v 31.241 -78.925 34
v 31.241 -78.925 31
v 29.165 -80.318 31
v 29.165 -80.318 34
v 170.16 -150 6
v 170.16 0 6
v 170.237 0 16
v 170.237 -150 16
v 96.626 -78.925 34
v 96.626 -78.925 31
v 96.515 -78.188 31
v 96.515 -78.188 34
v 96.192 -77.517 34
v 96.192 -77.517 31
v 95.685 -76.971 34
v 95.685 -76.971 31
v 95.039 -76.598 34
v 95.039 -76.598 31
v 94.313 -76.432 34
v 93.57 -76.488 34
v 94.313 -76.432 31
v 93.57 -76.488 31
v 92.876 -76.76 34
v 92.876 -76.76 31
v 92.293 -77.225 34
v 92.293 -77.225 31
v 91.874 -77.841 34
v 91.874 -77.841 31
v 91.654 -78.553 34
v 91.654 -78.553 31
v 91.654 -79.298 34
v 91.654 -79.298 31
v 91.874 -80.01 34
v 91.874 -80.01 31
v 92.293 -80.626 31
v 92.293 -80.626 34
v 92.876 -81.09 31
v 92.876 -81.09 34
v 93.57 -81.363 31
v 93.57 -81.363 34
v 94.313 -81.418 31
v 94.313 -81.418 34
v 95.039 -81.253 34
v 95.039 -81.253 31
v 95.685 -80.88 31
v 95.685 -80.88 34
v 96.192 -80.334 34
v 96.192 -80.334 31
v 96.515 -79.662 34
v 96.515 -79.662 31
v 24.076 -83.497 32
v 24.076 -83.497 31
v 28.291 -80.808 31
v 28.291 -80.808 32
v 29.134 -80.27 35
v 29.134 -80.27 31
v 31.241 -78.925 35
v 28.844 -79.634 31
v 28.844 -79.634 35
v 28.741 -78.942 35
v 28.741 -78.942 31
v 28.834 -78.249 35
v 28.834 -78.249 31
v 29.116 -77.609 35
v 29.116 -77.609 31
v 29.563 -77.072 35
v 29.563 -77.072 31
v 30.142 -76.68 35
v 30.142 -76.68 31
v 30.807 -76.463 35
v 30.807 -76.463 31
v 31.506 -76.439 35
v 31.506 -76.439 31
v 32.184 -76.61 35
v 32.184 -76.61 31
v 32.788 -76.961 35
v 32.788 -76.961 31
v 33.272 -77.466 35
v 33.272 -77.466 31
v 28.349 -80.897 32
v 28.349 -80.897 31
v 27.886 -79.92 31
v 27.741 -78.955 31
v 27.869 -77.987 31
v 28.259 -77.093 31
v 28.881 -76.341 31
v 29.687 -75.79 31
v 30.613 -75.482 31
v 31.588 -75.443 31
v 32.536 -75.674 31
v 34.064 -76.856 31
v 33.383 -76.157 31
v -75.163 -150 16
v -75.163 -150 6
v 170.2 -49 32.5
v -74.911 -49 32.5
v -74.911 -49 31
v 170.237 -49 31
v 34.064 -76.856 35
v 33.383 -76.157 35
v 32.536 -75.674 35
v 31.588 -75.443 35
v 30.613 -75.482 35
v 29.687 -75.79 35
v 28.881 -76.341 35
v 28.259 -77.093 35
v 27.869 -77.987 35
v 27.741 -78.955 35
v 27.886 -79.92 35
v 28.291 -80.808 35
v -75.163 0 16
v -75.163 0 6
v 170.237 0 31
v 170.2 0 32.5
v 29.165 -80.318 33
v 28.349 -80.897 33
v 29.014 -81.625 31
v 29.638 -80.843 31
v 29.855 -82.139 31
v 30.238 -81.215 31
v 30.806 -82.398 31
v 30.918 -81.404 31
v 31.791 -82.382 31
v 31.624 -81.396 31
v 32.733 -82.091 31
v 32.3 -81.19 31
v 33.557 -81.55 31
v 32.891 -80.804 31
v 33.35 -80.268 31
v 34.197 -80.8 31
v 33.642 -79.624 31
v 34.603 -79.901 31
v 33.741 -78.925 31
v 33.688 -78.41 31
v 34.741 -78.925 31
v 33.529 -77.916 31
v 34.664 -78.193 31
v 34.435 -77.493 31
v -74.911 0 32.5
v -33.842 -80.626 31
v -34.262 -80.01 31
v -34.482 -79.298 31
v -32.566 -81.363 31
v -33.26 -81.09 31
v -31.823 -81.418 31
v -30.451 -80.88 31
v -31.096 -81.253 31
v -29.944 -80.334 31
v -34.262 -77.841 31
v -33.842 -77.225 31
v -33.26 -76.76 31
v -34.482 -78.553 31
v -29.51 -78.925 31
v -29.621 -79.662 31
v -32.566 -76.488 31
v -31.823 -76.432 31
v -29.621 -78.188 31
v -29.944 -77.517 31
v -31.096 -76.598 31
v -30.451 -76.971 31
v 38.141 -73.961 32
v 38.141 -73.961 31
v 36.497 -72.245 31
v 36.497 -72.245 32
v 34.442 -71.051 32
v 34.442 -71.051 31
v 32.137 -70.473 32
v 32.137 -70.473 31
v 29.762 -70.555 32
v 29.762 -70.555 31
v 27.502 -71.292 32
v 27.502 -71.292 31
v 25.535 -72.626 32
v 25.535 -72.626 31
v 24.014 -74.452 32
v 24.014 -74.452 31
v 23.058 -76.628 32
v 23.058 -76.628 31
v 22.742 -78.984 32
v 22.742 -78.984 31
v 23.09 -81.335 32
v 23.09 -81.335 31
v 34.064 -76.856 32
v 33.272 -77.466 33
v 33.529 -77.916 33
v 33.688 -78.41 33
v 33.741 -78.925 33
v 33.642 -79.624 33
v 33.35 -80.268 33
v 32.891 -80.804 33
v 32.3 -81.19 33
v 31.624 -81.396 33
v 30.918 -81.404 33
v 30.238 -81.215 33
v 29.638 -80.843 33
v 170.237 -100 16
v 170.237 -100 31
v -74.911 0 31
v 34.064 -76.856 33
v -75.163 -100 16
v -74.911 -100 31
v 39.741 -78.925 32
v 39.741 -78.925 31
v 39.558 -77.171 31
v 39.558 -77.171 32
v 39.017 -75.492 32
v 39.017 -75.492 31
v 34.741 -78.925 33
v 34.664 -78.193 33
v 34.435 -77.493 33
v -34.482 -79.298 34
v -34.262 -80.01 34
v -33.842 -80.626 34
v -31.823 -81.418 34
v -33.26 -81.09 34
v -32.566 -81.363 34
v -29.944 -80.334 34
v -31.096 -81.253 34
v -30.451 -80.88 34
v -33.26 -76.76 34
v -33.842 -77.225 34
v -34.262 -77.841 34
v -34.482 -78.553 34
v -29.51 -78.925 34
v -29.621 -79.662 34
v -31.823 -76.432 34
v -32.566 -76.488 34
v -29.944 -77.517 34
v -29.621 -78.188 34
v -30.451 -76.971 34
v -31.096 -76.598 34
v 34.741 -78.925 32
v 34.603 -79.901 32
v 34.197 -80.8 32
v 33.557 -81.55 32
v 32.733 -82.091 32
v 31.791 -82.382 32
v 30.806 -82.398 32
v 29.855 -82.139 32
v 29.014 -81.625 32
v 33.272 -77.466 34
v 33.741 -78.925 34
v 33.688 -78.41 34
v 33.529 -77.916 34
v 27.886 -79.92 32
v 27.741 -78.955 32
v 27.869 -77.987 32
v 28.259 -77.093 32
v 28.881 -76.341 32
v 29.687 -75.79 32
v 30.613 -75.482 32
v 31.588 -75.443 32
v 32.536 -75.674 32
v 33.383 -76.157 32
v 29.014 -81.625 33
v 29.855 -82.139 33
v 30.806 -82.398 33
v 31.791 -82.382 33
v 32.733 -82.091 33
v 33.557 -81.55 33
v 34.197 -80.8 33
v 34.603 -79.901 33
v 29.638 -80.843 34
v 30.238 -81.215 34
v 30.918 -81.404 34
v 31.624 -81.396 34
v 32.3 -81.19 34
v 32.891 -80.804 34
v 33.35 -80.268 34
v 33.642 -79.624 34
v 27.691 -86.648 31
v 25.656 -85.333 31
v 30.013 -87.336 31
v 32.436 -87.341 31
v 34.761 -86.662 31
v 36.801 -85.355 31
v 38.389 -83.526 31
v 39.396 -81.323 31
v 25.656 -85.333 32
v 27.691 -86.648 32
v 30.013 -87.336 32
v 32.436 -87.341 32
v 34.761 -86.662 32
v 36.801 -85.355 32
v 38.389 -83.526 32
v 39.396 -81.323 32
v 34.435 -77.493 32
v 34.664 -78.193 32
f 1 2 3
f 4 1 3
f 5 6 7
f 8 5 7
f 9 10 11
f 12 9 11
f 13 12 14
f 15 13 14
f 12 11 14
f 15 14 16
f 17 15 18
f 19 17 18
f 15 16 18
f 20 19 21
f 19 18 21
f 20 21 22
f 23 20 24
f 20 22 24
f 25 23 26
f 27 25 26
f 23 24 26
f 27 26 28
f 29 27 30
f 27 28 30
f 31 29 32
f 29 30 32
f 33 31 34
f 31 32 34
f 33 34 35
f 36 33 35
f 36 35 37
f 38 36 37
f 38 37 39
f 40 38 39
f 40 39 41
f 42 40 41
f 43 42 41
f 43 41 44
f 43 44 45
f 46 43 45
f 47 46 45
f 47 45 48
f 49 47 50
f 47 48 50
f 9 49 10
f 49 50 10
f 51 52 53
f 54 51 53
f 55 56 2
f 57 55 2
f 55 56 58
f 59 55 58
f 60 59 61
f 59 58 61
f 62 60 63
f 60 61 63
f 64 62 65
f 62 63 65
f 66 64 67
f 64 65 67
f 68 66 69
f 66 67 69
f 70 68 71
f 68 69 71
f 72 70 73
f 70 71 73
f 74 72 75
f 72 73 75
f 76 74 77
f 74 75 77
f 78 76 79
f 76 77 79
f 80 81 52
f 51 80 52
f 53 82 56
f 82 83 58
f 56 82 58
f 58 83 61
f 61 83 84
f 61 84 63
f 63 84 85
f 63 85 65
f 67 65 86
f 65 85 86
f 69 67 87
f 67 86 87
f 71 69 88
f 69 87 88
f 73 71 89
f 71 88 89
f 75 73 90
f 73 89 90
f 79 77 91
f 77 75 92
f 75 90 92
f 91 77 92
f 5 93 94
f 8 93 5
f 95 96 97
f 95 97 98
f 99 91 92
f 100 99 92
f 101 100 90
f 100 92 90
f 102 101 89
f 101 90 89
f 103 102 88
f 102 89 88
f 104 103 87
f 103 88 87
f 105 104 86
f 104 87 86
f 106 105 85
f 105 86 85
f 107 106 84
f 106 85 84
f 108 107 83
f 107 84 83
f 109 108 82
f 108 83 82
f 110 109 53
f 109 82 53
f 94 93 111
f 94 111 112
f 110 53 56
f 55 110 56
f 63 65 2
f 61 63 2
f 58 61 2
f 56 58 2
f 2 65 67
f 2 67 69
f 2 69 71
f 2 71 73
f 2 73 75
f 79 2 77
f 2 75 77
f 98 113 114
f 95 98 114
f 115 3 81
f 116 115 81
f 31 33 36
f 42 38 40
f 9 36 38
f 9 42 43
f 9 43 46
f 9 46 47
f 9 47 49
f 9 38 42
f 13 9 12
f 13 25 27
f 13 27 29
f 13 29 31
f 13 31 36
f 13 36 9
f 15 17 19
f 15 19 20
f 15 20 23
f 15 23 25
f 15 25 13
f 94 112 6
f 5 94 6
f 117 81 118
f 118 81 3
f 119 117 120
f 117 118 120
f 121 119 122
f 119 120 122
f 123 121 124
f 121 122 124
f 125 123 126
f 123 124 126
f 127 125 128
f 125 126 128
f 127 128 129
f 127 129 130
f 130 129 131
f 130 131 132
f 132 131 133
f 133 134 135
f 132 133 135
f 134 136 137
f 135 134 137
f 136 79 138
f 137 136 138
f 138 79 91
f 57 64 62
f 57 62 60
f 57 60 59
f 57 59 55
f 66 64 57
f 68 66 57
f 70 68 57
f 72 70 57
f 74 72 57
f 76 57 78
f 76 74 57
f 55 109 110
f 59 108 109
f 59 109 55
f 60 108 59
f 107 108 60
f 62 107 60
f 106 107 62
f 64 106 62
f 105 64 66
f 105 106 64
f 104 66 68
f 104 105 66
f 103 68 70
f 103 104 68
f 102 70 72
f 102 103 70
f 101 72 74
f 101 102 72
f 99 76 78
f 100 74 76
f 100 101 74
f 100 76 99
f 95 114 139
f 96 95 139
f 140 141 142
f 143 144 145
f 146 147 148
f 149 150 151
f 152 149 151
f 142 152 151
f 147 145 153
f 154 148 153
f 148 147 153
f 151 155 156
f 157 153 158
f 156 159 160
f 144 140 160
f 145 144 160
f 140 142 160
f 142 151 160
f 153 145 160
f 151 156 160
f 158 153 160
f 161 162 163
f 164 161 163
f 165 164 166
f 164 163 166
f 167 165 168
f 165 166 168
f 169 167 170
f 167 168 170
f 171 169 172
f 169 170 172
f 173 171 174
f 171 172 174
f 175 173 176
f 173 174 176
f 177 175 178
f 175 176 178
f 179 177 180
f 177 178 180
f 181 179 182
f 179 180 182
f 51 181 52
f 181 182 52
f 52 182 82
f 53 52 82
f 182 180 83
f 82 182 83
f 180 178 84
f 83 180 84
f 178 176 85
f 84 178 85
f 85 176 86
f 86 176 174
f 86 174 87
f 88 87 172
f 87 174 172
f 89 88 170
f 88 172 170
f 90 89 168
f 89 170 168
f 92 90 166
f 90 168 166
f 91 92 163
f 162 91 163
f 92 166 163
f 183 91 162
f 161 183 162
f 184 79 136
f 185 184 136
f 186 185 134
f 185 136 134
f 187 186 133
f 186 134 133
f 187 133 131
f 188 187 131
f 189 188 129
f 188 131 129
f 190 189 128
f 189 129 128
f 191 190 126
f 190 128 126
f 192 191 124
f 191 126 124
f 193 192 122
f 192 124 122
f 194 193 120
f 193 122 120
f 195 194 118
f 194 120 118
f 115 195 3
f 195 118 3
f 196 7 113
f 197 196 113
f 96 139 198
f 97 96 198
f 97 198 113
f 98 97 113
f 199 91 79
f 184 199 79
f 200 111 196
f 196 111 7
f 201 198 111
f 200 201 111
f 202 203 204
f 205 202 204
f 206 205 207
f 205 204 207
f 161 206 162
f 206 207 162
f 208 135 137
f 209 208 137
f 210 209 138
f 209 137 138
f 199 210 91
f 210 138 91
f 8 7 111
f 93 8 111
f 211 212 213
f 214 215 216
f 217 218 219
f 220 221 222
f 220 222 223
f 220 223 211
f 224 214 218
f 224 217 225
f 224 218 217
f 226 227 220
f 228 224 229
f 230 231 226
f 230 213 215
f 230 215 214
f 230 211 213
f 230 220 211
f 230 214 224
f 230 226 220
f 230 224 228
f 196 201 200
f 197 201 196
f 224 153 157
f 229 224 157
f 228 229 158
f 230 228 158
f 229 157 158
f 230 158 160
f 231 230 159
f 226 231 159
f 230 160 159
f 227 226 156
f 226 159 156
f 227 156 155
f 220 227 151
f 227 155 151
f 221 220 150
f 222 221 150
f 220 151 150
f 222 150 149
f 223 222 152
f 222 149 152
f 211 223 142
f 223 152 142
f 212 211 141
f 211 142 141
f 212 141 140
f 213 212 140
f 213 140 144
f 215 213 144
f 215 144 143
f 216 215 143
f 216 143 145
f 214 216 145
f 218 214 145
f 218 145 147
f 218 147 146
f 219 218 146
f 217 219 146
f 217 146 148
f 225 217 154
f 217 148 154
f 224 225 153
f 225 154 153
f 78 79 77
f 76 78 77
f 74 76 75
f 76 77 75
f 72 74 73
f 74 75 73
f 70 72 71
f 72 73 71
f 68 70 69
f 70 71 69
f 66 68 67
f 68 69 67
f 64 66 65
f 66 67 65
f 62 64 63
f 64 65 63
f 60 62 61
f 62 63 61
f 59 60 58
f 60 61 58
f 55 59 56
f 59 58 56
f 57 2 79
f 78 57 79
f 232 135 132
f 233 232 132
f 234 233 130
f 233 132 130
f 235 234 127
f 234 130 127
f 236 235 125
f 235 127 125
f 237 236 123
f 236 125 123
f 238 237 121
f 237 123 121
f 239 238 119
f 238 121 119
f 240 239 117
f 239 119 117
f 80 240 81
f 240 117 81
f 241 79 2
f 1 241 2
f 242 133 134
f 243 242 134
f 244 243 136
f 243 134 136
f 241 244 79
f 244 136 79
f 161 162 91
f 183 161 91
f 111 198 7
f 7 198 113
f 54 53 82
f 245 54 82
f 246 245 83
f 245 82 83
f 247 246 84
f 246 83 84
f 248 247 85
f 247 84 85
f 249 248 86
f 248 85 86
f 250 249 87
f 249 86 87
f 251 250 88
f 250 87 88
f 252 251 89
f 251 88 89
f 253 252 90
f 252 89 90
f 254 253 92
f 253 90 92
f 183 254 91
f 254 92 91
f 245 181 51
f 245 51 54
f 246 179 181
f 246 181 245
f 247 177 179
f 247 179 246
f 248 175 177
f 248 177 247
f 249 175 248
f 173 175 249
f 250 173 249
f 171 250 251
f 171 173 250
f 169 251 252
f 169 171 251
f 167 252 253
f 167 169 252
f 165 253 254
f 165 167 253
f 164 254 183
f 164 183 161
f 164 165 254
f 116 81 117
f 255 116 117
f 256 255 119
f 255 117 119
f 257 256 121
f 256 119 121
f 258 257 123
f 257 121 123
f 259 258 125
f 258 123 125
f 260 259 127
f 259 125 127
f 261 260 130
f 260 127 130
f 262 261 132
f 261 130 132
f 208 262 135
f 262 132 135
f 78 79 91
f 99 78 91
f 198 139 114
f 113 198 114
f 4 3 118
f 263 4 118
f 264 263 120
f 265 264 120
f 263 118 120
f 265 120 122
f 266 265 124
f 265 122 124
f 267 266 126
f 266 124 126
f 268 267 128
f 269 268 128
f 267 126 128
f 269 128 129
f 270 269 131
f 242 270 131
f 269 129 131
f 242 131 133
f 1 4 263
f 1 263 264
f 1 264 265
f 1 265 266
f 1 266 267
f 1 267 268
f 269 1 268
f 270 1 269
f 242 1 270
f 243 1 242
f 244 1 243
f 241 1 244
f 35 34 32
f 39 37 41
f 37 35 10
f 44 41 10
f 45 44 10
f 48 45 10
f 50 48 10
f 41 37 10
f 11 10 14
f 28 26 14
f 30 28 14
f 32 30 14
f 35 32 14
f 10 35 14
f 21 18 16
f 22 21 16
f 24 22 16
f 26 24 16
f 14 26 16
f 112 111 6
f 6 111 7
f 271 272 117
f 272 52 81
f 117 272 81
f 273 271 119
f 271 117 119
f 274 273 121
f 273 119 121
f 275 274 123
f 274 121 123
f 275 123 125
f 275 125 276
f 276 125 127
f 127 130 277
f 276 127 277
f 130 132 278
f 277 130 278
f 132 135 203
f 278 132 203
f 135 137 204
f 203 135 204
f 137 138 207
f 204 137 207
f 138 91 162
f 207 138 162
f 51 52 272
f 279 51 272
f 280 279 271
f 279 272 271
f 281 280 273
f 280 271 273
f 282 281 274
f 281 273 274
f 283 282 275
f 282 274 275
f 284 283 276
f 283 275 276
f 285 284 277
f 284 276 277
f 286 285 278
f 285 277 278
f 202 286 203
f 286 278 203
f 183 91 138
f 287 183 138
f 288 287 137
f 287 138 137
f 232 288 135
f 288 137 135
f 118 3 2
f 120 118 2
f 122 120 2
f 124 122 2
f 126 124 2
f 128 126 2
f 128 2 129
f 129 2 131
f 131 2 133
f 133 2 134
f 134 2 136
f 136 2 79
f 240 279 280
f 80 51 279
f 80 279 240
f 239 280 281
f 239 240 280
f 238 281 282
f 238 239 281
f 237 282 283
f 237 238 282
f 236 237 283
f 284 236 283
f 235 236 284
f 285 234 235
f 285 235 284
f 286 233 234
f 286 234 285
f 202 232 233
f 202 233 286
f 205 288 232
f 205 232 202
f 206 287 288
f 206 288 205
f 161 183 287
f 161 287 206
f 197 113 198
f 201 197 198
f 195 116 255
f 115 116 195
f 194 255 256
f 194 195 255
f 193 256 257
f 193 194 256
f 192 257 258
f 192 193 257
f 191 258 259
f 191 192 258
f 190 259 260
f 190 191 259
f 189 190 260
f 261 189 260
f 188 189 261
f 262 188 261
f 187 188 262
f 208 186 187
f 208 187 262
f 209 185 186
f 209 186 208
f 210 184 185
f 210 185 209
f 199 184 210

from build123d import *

# Parameters (mm, degrees)
F1_DEPTH  = 150
F2_DEPTH  = 100
F3_DEPTH  = 49
F4_R      = 2.5
F5_DEPTH  = 3
F6_DEPTH  = 3
F7_DEPTH  = 3
F8_DEPTH  = 4
F9_DEPTH  = 4
F10_DEPTH = 2
F11_DEPTH = 1
F12_DEPTH = 1


with BuildPart() as f1:
    # F0 (on Front) → F1 (new body)
    with BuildSketch(Plane.XZ):
        Polygon((-21.76261, 16), (-43.054478, 16), (-75.163431, 16), (-75.163431, 6.0003), (170.159972, 6.0003), (170.23739, 16), (148.945522, 16), (106.23739, 16), (84.945522, 16), (42.23739, 16), (20.945522, 16), align=None)
    extrude(amount=F1_DEPTH)


with BuildPart() as f2:
    # F0 (on Front) → F2 (new body)
    with BuildSketch(Plane.XZ):
        Polygon((-75.163431, 16), (-43.054478, 16), (-21.76261, 16), (20.945522, 16), (42.23739, 16), (84.945522, 16), (106.23739, 16), (148.945522, 16), (170.23739, 16), (170.23739, 31), (-74.911438, 31), align=None)
    extrude(amount=F2_DEPTH)


with BuildPart() as f3:
    # F0 (on Front) → F3 (new body)
    with BuildSketch(Plane.XZ):
        Polygon((-74.911438, 32.499531), (-74.911438, 31), (170.23739, 31), (170.199873, 32.499531), align=None)
    extrude(amount=F3_DEPTH)


with BuildPart() as f5:
    # F4 (on face) → F5 (new body)
    with BuildSketch(Plane.XY.offset(31)):
        with Locations((94.12609, -78.925343)):
            Circle(F4_R)
    extrude(amount=F5_DEPTH)


with BuildPart() as f6:
    # F4 (on face) → F6 (new body)
    with BuildSketch(Plane.XY.offset(31)):
        with Locations((-32.009708, -78.925343)):
            Circle(F4_R)
    extrude(amount=F6_DEPTH)


with BuildPart() as f7:
    # F4 (on face) → F7 (new body)
    with BuildSketch(Plane.XY.offset(31)):
        with BuildLine():
            ThreePointArc((29.16524, -80.318087), (31.969267, -81.317026), (33.741357, -78.925343))
            ThreePointArc((33.741357, -78.925343), (33.620999, -78.158986), (33.271515, -77.466419))
            Line((33.271515, -77.466419), (31.241357, -78.925343))
            Line((31.241357, -78.925343), (29.16524, -80.318087))
        make_face()
    extrude(amount=F7_DEPTH)


with BuildPart() as f8:
    # F4 (on face) → F8 (new body)
    with BuildSketch(Plane.XY.offset(31)):
        with BuildLine():
            Line((31.241357, -78.925343), (33.271515, -77.466419))
            ThreePointArc((33.271515, -77.466419), (29.838999, -76.855707), (29.133819, -80.270068))
            Line((29.133819, -80.270068), (31.241357, -78.925343))
        make_face()
    extrude(amount=F8_DEPTH)


with BuildPart() as f9:
    # F4 (on face) → F9 (new body)
    with BuildSketch(Plane.XY.offset(31)):
        with BuildLine():
            ThreePointArc((29.133819, -80.270068), (29.838999, -76.855707), (33.271515, -77.466419))
            Line((33.271515, -77.466419), (34.064402, -76.856425))
            ThreePointArc((34.064402, -76.856425), (29.264563, -76.037042), (28.290804, -80.807958))
            Line((28.290804, -80.807958), (29.133819, -80.270068))
        make_face()
    extrude(amount=F9_DEPTH)


with BuildPart() as f10:
    # F4 (on face) → F10 (new body)
    with BuildSketch(Plane.XY.offset(31)):
        with BuildLine():
            ThreePointArc((33.271515, -77.466419), (33.620999, -78.158986), (33.741357, -78.925343))
            ThreePointArc((33.741357, -78.925343), (31.969267, -81.317026), (29.16524, -80.318087))
            Line((29.16524, -80.318087), (28.349255, -80.896573))
            ThreePointArc((28.349255, -80.896573), (32.272775, -82.269917), (34.741357, -78.925343))
            ThreePointArc((34.741357, -78.925343), (34.567816, -77.836916), (34.064402, -76.856425))
            Line((34.064402, -76.856425), (33.271515, -77.466419))
        make_face()
    extrude(amount=F10_DEPTH)


with BuildPart() as f11:
    # F4 (on face) → F11 (new body)
    with BuildSketch(Plane.XY.offset(31)):
        with BuildLine():
            ThreePointArc((28.290804, -80.807958), (29.264563, -76.037042), (34.064402, -76.856425))
            Line((34.064402, -76.856425), (38.141315, -73.961415))
            ThreePointArc((38.141315, -73.961415), (26.471511, -71.889821), (24.075729, -83.497407))
            Line((24.075729, -83.497407), (28.290804, -80.807958))
        make_face()
    extrude(amount=F11_DEPTH)


with BuildPart() as f12:
    # F4 (on face) → F12 (new body)
    with BuildSketch(Plane.XY.offset(31)):
        with BuildLine():
            Line((38.141315, -73.961415), (34.064402, -76.856425))
            ThreePointArc((34.064402, -76.856425), (34.567816, -77.836916), (34.741357, -78.925343))
            ThreePointArc((34.741357, -78.925343), (32.272775, -82.269917), (28.349255, -80.896573))
            Line((28.349255, -80.896573), (24.075729, -83.497407))
            ThreePointArc((24.075729, -83.497407), (33.62276, -87.084933), (39.741357, -78.925343))
            ThreePointArc((39.741357, -78.925343), (39.331464, -76.317628), (38.141315, -73.961415))
        make_face()
    extrude(amount=F12_DEPTH)


solid = Compound([f1.part, f2.part, f3.part, f5.part, f6.part, f7.part, f8.part, f9.part, f10.part, f11.part, f12.part])
